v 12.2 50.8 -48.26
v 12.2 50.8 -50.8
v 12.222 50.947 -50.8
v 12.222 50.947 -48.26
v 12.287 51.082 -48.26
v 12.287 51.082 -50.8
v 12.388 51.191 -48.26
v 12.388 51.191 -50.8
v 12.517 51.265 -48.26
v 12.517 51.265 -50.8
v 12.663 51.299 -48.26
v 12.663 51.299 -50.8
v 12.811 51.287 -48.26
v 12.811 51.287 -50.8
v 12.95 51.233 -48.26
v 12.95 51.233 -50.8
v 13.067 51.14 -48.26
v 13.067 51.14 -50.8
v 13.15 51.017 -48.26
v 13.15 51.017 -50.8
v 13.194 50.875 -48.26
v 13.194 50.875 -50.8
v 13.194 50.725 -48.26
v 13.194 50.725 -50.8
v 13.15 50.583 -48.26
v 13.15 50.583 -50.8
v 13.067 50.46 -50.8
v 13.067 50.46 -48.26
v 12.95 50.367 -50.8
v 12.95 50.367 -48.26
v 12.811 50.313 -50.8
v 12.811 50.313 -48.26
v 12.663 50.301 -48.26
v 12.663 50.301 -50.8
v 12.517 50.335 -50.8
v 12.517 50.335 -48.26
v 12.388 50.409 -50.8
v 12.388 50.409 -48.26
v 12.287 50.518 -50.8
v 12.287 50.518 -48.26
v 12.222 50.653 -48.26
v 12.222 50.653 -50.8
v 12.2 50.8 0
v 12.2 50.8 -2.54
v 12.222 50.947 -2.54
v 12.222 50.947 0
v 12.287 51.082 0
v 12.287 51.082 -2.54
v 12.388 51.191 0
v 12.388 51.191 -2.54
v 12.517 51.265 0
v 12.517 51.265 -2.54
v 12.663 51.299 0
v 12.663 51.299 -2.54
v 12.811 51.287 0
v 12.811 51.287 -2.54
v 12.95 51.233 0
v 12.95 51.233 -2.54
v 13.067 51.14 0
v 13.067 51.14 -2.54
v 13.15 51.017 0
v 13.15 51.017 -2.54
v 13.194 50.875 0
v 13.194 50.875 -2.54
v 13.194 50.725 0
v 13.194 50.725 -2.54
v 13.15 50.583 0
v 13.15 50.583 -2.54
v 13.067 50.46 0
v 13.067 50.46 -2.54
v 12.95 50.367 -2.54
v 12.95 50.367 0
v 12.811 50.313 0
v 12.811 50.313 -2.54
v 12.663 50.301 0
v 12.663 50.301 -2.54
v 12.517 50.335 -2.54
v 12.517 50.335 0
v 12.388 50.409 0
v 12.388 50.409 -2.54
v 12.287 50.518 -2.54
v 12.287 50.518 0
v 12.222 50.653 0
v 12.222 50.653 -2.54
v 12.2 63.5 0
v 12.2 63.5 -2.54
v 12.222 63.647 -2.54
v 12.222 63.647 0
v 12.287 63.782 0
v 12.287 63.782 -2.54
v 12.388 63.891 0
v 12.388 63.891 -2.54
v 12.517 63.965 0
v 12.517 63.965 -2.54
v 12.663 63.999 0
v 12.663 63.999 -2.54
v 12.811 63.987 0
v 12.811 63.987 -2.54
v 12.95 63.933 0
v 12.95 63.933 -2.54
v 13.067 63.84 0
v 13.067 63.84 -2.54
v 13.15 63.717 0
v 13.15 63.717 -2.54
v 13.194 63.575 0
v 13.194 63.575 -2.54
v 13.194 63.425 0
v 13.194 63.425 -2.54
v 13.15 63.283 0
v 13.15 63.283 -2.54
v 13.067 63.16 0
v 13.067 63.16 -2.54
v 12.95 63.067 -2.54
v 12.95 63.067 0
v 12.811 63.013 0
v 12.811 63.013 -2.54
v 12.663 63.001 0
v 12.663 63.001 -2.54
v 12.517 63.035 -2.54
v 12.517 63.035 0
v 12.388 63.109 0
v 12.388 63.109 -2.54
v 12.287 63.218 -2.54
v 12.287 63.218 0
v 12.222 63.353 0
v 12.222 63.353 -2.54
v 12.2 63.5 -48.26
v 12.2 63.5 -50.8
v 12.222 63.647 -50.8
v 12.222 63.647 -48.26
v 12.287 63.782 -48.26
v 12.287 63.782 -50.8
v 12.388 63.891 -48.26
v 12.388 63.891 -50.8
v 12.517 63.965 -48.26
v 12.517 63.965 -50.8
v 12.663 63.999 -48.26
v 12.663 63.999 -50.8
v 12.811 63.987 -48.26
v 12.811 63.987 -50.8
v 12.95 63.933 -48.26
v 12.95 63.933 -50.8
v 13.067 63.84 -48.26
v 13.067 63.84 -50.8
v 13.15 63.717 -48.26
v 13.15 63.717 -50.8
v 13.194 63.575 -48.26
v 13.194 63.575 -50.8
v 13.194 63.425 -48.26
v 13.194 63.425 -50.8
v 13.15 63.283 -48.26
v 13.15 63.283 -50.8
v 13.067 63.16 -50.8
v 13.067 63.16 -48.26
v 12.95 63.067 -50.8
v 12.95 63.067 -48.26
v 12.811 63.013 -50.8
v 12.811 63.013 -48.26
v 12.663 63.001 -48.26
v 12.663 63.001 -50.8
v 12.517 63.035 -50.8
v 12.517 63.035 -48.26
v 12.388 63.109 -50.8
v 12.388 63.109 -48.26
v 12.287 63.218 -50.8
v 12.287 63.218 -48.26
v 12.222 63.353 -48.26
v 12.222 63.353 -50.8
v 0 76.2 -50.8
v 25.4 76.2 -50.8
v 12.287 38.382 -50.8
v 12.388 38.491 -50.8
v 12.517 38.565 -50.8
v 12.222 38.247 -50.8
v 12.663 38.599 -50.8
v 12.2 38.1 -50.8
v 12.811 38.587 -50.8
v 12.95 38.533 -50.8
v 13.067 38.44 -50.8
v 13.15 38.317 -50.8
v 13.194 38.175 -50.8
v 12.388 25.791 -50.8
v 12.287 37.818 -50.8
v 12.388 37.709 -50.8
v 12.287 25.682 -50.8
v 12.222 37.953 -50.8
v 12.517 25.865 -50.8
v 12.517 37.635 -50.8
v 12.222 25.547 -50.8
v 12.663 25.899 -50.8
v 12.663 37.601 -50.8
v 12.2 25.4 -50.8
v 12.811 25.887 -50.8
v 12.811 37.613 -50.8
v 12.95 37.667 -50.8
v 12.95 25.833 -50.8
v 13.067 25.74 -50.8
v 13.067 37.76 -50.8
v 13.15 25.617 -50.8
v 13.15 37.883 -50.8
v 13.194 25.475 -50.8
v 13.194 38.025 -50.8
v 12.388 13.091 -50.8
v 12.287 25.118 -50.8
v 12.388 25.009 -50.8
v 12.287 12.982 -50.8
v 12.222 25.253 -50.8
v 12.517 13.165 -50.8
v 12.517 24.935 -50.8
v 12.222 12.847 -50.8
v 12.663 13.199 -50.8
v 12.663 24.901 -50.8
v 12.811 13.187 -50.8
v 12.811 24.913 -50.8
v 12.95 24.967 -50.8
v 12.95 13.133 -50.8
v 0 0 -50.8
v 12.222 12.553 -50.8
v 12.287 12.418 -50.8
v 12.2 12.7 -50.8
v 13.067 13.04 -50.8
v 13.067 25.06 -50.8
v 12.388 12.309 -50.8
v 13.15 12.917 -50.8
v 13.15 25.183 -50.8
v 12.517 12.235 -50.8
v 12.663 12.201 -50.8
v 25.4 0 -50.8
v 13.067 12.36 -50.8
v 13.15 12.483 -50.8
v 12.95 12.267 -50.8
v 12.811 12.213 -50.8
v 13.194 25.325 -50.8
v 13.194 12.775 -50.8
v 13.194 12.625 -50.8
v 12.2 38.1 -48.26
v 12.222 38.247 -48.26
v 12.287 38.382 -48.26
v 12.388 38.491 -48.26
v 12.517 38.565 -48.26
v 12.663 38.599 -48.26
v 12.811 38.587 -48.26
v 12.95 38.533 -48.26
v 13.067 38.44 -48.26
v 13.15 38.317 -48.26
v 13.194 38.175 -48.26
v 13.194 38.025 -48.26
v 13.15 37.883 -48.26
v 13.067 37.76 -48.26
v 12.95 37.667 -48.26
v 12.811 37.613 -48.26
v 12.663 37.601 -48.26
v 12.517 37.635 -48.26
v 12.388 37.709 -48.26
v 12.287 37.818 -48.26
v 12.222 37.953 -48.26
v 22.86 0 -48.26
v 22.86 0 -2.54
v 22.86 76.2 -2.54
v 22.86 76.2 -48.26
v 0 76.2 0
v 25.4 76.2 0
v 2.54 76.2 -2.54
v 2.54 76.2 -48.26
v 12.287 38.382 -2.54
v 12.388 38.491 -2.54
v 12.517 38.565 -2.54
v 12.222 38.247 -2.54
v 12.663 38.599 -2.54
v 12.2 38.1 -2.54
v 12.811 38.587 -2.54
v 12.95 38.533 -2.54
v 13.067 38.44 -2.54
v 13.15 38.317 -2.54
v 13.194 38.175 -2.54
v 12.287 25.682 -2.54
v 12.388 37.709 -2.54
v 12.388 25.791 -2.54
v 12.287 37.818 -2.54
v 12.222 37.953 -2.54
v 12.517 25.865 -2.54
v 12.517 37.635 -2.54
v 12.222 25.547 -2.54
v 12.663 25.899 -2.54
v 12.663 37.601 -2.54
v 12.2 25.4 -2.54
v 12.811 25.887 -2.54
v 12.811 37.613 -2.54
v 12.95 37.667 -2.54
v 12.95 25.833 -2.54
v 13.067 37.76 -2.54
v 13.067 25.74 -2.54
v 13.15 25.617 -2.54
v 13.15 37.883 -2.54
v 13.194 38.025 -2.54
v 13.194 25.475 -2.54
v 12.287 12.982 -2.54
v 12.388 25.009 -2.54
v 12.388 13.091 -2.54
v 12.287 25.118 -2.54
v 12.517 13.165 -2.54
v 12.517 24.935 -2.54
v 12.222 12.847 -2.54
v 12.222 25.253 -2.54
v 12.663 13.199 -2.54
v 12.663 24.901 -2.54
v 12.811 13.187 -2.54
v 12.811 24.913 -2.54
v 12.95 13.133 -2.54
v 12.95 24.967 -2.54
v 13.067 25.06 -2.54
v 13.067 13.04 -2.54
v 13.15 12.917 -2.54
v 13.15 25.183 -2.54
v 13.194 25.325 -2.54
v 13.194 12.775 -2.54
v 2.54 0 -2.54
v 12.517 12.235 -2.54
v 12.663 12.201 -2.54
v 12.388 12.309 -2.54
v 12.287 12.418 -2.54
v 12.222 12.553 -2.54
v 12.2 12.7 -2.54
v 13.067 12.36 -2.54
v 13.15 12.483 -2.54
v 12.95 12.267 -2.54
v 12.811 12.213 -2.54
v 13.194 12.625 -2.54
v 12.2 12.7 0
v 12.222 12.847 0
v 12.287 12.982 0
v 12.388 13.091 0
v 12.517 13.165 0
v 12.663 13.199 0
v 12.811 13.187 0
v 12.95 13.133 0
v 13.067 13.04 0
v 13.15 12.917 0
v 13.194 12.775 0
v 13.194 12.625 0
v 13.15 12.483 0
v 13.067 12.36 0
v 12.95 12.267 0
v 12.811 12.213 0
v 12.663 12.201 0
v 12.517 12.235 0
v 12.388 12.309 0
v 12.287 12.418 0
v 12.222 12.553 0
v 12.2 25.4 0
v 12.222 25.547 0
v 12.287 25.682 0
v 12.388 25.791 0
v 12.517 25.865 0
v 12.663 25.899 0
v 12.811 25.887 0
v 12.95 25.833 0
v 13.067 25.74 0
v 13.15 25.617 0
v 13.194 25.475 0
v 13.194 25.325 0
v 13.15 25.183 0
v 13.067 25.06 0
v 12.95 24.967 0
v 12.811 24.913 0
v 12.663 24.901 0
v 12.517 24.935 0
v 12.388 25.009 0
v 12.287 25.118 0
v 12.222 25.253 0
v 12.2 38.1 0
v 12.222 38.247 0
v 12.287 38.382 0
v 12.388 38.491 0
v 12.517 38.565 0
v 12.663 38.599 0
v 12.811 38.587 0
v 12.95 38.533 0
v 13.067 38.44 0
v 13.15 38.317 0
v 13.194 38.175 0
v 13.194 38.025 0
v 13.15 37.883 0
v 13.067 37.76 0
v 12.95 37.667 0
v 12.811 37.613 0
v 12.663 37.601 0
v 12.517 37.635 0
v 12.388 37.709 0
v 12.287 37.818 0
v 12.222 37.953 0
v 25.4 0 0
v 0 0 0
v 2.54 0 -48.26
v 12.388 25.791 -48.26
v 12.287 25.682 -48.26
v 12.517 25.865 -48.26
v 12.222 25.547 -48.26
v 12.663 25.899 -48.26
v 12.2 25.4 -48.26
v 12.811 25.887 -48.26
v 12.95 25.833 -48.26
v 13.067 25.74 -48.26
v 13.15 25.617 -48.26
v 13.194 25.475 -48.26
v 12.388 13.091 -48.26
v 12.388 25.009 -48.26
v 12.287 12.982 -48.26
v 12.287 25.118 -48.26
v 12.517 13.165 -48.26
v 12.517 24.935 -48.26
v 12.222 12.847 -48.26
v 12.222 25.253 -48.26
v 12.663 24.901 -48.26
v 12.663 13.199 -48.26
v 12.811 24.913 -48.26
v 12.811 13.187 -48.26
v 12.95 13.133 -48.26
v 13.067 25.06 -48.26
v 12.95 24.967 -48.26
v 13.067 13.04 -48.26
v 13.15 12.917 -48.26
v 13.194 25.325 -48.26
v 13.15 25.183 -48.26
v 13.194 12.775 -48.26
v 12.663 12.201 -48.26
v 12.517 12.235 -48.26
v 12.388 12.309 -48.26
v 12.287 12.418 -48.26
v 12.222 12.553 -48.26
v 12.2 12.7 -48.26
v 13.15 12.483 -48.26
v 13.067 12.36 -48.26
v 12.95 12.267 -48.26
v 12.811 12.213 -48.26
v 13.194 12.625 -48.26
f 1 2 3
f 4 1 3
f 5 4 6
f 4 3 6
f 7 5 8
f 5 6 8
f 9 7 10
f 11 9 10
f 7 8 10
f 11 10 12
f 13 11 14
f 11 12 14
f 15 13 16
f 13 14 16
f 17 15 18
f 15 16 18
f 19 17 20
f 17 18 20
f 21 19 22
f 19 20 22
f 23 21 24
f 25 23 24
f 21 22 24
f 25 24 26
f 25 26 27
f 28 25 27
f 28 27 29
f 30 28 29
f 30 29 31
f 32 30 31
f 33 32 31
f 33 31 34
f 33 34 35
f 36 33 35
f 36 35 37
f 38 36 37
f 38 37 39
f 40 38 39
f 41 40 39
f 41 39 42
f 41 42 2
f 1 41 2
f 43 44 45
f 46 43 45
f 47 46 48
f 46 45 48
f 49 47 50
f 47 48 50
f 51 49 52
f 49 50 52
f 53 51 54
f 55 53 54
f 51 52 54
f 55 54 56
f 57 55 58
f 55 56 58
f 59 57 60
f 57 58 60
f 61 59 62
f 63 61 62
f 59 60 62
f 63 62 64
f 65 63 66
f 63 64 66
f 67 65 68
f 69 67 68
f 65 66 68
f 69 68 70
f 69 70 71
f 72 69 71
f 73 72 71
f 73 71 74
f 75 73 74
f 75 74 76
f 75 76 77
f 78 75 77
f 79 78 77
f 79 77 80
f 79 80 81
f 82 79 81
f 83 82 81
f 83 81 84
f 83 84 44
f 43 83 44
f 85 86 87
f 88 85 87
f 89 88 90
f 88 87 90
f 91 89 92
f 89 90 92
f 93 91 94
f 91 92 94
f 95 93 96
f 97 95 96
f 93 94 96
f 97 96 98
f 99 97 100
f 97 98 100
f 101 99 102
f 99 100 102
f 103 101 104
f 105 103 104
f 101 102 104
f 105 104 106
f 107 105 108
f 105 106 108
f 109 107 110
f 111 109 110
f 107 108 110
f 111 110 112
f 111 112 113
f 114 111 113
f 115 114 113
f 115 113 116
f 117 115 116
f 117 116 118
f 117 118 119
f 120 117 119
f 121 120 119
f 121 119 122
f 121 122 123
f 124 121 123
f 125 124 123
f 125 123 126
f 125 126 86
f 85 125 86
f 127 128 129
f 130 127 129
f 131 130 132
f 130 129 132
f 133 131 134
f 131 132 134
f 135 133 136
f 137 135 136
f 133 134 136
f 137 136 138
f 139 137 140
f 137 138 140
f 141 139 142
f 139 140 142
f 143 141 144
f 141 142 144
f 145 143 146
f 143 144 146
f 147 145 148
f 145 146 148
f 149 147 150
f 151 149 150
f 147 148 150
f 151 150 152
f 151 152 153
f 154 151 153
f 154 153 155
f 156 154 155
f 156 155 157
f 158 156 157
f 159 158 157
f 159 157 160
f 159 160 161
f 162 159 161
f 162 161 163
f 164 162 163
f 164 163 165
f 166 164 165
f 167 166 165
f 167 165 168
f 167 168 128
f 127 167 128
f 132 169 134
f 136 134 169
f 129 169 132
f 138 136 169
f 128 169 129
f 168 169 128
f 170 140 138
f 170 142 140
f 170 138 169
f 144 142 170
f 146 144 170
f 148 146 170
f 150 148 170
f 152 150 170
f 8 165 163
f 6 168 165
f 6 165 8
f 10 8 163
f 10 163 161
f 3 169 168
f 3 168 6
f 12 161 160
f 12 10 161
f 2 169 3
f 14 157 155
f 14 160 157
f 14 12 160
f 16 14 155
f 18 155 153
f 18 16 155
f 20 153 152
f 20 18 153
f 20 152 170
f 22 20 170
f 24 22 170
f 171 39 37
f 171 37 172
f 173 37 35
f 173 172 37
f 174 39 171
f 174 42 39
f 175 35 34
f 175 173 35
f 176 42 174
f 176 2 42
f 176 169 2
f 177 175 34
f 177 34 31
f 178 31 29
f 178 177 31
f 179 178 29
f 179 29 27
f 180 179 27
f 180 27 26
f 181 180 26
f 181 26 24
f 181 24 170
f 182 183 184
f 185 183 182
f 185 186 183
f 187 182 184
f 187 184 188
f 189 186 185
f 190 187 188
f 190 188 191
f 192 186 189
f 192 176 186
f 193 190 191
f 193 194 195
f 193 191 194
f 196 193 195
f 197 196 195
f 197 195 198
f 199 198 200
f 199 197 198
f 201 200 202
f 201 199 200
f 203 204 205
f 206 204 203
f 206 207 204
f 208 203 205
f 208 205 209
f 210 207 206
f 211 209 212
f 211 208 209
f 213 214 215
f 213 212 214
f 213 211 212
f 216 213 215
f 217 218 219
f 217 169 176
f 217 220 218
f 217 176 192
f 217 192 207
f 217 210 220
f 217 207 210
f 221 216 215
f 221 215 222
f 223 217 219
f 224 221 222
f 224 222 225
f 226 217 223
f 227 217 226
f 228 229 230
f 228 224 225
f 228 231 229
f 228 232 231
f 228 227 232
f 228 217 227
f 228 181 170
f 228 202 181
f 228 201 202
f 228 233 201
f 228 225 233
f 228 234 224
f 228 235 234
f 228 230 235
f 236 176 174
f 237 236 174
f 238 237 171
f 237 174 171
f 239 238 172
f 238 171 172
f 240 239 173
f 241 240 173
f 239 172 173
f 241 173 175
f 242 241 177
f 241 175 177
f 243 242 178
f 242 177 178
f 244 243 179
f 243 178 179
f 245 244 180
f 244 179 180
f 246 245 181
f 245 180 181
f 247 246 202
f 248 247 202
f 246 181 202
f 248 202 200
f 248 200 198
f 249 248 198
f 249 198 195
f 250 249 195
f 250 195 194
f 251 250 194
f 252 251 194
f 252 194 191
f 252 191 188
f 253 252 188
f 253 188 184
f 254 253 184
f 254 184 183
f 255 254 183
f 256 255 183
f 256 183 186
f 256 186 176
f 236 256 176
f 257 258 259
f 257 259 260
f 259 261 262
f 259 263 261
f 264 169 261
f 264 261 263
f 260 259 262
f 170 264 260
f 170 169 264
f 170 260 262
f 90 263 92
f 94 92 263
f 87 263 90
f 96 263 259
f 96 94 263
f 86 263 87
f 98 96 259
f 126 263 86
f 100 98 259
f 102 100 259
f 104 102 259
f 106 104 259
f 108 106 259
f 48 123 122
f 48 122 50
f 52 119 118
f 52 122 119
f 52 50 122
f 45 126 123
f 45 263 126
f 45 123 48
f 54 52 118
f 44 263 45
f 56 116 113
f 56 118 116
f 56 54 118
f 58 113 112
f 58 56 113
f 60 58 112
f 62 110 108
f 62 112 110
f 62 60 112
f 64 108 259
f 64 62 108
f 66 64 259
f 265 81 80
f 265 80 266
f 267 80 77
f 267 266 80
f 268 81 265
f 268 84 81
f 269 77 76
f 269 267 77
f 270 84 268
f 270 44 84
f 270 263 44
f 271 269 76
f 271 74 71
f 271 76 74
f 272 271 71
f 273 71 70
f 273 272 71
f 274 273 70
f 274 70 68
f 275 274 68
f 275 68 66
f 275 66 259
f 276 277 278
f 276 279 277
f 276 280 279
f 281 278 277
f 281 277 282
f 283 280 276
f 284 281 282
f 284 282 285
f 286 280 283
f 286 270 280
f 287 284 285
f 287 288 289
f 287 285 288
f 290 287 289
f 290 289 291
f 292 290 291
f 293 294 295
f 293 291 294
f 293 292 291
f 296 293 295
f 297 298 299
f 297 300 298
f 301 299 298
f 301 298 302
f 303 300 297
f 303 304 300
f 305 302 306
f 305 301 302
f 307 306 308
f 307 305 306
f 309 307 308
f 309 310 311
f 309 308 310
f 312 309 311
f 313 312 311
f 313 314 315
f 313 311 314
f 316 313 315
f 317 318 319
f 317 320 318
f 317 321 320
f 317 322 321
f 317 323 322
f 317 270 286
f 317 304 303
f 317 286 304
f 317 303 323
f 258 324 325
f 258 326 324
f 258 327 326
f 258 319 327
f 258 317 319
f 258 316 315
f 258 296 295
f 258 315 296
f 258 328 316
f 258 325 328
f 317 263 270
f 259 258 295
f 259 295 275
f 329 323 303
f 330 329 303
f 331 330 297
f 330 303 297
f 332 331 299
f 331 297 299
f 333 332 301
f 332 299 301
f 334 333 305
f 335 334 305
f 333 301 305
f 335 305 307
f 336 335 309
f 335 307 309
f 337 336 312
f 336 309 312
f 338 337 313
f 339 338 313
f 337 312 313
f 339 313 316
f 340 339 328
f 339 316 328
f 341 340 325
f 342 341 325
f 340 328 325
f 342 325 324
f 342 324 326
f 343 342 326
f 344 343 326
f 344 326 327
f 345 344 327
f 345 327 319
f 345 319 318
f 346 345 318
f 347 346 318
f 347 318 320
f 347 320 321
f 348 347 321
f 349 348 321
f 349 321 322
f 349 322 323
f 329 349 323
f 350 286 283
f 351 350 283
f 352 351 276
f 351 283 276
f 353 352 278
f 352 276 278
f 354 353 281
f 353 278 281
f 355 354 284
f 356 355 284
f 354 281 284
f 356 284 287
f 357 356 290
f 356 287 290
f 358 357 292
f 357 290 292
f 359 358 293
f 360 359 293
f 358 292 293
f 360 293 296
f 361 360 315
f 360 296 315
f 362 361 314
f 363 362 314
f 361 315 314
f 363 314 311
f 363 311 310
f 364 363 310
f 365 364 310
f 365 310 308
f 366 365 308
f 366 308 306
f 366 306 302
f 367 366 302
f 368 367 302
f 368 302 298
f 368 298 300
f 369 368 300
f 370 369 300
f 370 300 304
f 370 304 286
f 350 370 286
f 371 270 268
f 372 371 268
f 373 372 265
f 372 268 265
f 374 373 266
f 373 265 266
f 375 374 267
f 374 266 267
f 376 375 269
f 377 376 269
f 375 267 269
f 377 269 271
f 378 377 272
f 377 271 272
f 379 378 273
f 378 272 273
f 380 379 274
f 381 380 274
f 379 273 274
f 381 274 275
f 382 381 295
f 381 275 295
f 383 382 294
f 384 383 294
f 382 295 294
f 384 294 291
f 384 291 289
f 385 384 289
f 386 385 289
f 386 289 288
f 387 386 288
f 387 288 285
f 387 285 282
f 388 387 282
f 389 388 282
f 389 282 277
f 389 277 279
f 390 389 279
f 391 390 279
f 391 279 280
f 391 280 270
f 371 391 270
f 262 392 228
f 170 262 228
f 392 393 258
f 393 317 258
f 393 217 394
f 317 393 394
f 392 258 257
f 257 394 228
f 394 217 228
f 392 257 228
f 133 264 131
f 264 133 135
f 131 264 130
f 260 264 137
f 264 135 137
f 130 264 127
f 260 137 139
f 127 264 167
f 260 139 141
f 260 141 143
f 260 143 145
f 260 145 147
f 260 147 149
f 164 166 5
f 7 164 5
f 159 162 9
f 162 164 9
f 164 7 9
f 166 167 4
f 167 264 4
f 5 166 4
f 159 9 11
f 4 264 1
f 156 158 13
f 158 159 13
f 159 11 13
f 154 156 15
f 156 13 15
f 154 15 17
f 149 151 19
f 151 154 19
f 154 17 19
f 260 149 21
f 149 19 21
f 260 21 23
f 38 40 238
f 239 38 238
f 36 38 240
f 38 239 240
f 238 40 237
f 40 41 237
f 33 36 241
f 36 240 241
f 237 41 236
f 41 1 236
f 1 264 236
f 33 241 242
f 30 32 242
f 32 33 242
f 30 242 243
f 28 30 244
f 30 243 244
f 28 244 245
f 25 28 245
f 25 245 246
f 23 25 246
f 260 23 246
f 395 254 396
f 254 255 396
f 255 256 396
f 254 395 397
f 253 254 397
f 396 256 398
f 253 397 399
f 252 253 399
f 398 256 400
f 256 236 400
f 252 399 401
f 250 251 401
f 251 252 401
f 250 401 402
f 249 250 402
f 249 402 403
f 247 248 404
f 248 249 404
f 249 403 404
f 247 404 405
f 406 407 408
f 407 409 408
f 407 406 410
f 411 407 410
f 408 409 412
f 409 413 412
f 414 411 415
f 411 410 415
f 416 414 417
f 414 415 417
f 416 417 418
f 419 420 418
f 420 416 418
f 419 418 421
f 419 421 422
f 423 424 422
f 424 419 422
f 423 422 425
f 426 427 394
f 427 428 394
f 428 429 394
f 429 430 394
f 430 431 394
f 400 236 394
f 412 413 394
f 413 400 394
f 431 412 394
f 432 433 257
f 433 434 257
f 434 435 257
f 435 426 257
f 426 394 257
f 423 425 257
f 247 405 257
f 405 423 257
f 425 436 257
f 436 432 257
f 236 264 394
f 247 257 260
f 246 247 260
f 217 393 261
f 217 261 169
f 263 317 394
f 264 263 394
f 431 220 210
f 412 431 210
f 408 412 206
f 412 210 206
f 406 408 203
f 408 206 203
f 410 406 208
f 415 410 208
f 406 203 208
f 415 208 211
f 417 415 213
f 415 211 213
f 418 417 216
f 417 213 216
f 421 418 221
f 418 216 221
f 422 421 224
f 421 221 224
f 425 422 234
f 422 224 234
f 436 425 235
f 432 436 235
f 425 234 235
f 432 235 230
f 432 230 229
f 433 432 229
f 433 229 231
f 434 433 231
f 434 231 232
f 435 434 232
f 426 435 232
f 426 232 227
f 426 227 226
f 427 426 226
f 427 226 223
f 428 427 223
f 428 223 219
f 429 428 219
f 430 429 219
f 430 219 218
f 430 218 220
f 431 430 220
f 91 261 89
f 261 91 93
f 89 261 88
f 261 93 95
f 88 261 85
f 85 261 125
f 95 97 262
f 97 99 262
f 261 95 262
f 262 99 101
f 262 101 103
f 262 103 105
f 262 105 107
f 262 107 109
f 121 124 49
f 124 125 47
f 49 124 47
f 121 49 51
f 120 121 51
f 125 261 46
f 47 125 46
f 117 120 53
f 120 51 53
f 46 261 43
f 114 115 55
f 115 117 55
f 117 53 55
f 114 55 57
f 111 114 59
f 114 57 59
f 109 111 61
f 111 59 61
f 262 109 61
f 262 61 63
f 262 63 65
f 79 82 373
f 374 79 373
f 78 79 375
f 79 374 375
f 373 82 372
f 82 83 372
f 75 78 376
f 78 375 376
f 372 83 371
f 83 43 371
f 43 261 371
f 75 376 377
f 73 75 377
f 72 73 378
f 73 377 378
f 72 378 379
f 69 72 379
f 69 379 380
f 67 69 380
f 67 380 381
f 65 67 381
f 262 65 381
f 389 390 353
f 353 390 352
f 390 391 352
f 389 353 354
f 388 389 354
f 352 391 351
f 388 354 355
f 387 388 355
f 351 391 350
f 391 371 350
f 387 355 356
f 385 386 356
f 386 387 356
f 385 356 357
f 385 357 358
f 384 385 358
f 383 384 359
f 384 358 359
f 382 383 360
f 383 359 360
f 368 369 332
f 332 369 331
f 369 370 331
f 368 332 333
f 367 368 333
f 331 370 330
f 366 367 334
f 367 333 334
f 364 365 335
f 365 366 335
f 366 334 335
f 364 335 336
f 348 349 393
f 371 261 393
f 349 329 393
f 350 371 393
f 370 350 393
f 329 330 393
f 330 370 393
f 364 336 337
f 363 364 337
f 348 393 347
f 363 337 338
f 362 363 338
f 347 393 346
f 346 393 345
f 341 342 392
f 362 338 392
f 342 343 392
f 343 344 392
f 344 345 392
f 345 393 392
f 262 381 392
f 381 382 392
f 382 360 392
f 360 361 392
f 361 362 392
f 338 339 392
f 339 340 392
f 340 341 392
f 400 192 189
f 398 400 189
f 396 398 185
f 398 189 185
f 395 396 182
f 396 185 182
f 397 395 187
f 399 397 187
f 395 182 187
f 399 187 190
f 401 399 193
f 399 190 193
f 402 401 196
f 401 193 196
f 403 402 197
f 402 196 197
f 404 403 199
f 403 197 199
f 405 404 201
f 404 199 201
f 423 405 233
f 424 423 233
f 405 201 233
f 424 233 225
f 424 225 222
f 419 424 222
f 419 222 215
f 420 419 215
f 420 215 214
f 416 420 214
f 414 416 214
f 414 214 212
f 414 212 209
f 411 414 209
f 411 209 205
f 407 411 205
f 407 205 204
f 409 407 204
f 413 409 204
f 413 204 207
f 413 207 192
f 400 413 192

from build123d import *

# Parameters (mm, degrees)
SKETCH1_W           = 25.4
SKETCH1_H           = 50.8
SKETCH1_W_2         = 20.32
SKETCH1_H_2         = 45.72
BOSS_EXTRUDE1_DEPTH = 76.2
SKETCH2_R           = 0.5
CUT_EXTRUDE1_DEPTH  = 76.2


with BuildPart() as part:
    # Sketch1 → Boss-Extrude1 (new body)
    with BuildSketch(Plane(origin=(0, 0, 0), x_dir=(1, 0, 0), z_dir=(0, 1, 0))):
        with Locations((12.7, 25.4)):
            Rectangle(SKETCH1_W, SKETCH1_H)
        with Locations((12.7, 25.4)):
            Rectangle(SKETCH1_W_2, SKETCH1_H_2, mode=Mode.SUBTRACT)
    extrude(amount=BOSS_EXTRUDE1_DEPTH)

    # Sketch2 → Cut-Extrude1 (cut)
    with BuildSketch(Plane(origin=(0, 0, -50.8), x_dir=(-1, 0, 0), z_dir=(0, 0, -1))):
        with Locations((-12.7, 12.7)):
            Circle(SKETCH2_R)
        with Locations((-12.7, 25.4)):
            Circle(SKETCH2_R)
        with Locations((-12.7, 38.1)):
            Circle(SKETCH2_R)
        with Locations((-12.7, 50.8)):
            Circle(SKETCH2_R)
        with Locations((-12.7, 63.5)):
            Circle(SKETCH2_R)
    extrude(amount=-CUT_EXTRUDE1_DEPTH, mode=Mode.SUBTRACT)


solid = part.part
